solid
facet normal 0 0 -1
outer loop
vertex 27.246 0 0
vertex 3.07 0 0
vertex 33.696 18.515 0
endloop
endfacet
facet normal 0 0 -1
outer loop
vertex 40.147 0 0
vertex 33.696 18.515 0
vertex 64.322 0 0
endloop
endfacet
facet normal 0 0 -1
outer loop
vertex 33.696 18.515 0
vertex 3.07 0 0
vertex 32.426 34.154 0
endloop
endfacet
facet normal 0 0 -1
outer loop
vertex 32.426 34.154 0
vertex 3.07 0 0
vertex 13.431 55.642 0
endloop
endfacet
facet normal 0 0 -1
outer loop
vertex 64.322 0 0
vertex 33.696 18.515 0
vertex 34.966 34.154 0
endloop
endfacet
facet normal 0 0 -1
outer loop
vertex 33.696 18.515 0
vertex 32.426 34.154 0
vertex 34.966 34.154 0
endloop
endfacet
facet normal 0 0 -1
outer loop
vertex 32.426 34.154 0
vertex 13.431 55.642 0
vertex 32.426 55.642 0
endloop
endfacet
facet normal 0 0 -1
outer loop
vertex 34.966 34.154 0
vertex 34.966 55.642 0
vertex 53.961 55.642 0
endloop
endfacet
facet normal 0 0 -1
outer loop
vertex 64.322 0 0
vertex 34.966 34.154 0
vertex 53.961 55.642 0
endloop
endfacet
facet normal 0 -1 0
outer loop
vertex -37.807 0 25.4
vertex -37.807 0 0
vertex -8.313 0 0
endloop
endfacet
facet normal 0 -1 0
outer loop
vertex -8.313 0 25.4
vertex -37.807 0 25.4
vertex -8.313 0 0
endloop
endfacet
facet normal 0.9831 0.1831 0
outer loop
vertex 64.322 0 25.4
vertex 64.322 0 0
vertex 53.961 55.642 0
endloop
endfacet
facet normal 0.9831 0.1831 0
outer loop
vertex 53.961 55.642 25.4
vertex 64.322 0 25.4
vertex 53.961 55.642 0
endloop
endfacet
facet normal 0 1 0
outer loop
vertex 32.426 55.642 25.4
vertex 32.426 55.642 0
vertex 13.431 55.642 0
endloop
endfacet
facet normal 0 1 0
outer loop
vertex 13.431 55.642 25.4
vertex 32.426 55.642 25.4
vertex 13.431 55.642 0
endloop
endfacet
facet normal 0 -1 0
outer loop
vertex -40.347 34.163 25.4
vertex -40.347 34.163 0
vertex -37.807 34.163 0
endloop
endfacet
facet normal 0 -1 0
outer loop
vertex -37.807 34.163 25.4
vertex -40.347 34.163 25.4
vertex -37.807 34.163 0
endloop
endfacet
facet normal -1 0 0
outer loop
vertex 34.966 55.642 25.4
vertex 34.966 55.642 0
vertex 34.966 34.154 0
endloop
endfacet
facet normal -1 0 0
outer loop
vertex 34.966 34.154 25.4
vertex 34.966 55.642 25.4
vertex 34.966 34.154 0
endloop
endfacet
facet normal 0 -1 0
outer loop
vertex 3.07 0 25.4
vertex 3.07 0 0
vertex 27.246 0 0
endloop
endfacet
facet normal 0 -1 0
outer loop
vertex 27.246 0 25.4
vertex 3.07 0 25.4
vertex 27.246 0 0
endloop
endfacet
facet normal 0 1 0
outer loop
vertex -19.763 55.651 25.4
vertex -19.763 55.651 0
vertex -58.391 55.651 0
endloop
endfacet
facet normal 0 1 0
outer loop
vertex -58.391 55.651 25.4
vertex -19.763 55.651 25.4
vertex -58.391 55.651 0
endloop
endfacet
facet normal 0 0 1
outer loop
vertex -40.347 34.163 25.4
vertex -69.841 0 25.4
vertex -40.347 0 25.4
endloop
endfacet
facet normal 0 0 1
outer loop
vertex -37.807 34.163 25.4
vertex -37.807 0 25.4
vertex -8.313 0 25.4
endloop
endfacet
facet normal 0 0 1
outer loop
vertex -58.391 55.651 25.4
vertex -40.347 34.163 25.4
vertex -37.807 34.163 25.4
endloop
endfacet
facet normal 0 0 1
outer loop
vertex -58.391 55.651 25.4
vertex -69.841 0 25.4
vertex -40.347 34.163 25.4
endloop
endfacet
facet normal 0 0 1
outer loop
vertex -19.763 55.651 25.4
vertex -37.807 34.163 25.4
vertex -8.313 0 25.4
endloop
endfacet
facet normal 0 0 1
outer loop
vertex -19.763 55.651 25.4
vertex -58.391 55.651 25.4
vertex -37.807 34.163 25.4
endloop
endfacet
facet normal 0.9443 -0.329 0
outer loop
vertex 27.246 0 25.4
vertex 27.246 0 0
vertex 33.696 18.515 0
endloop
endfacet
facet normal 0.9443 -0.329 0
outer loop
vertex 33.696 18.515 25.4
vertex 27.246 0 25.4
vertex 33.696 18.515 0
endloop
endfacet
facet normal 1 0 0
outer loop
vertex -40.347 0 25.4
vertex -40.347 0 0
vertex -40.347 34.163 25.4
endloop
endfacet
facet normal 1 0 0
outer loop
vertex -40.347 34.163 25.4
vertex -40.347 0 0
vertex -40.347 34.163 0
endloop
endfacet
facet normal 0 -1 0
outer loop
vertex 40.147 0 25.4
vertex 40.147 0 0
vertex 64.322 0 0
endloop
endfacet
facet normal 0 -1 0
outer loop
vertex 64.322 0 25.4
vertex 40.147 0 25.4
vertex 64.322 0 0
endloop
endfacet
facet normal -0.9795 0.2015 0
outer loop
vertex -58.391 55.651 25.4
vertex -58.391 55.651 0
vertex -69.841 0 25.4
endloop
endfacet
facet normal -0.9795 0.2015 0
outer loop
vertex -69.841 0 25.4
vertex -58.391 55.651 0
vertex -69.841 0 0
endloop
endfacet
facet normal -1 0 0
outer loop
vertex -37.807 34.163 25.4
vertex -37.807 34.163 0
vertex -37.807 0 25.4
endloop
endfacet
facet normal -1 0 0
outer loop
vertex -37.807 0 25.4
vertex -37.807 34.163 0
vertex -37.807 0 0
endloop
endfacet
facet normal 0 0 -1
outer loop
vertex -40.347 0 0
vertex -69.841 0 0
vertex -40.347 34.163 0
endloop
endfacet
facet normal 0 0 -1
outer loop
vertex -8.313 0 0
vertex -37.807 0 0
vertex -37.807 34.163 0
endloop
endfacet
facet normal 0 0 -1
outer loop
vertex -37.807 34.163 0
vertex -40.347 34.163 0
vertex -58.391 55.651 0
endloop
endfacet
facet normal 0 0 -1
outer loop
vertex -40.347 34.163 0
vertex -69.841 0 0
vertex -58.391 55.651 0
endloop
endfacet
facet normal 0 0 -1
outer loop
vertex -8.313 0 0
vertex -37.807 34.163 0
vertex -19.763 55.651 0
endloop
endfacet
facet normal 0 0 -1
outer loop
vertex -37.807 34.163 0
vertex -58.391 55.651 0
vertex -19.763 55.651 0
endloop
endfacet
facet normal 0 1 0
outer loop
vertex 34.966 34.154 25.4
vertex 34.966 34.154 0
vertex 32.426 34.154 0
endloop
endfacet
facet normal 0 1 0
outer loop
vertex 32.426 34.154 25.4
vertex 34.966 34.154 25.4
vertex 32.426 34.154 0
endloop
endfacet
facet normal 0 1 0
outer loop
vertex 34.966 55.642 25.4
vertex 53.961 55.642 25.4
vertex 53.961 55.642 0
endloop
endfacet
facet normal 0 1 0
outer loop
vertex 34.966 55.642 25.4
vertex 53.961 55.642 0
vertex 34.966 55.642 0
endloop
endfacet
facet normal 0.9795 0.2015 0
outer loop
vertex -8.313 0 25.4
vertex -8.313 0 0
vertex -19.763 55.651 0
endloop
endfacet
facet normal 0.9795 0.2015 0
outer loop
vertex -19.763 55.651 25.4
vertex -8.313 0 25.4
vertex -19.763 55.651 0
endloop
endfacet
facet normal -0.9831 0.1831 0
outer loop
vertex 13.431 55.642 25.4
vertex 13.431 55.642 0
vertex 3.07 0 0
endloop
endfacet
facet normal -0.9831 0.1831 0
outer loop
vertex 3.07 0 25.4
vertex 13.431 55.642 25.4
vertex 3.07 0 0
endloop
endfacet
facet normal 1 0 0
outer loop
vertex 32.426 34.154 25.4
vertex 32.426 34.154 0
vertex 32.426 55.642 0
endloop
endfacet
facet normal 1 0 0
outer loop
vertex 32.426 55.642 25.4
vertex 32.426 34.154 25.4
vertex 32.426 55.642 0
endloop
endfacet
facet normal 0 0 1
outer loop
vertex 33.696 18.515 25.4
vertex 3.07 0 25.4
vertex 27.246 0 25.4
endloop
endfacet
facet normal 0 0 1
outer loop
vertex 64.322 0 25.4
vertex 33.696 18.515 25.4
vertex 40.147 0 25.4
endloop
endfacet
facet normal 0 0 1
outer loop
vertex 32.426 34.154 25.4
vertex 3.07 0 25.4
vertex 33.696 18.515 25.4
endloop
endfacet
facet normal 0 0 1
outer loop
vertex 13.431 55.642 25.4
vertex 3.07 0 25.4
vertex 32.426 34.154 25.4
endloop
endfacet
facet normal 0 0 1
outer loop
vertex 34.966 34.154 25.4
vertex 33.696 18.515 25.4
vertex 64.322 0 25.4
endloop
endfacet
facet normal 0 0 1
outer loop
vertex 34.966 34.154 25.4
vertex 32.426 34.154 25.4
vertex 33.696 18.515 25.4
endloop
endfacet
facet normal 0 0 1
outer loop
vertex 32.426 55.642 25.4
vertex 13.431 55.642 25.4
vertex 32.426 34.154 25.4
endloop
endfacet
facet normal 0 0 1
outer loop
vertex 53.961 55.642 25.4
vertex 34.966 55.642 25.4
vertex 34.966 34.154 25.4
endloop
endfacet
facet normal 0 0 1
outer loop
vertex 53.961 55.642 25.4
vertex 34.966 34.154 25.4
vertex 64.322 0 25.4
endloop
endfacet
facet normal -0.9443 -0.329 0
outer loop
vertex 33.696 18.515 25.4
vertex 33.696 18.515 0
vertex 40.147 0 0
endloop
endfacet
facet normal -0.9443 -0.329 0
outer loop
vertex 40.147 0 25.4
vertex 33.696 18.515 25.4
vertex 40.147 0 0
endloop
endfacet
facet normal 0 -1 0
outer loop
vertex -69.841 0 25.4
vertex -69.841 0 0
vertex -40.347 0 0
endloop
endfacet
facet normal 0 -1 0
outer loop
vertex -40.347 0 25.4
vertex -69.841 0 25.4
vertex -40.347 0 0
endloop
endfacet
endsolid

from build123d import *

# Parameters (mm, degrees)
F1_DEPTH = 25.4


with BuildPart() as f1:
    # F0 (on Top) → F1 (new body)
    with BuildSketch(Plane.XY):
        Polygon((-8.312615, 0), (-19.762661, 55.6514), (-58.390822, 55.6514), (-69.840869, 0), (-40.346742, 0), (-40.346742, 34.163), (-37.806742, 34.163), (-37.806742, 0), align=None)
        Polygon((13.430934, 55.642445), (3.069927, 0), (27.245611, 0), (33.696111, 18.515165), (40.146612, 0), (64.322295, 0), (53.961288, 55.642445), (34.966111, 55.642445), (34.966111, 34.154045), (32.426111, 34.154045), (32.426111, 55.642445), align=None)
    extrude(amount=F1_DEPTH)


solid = f1.part
